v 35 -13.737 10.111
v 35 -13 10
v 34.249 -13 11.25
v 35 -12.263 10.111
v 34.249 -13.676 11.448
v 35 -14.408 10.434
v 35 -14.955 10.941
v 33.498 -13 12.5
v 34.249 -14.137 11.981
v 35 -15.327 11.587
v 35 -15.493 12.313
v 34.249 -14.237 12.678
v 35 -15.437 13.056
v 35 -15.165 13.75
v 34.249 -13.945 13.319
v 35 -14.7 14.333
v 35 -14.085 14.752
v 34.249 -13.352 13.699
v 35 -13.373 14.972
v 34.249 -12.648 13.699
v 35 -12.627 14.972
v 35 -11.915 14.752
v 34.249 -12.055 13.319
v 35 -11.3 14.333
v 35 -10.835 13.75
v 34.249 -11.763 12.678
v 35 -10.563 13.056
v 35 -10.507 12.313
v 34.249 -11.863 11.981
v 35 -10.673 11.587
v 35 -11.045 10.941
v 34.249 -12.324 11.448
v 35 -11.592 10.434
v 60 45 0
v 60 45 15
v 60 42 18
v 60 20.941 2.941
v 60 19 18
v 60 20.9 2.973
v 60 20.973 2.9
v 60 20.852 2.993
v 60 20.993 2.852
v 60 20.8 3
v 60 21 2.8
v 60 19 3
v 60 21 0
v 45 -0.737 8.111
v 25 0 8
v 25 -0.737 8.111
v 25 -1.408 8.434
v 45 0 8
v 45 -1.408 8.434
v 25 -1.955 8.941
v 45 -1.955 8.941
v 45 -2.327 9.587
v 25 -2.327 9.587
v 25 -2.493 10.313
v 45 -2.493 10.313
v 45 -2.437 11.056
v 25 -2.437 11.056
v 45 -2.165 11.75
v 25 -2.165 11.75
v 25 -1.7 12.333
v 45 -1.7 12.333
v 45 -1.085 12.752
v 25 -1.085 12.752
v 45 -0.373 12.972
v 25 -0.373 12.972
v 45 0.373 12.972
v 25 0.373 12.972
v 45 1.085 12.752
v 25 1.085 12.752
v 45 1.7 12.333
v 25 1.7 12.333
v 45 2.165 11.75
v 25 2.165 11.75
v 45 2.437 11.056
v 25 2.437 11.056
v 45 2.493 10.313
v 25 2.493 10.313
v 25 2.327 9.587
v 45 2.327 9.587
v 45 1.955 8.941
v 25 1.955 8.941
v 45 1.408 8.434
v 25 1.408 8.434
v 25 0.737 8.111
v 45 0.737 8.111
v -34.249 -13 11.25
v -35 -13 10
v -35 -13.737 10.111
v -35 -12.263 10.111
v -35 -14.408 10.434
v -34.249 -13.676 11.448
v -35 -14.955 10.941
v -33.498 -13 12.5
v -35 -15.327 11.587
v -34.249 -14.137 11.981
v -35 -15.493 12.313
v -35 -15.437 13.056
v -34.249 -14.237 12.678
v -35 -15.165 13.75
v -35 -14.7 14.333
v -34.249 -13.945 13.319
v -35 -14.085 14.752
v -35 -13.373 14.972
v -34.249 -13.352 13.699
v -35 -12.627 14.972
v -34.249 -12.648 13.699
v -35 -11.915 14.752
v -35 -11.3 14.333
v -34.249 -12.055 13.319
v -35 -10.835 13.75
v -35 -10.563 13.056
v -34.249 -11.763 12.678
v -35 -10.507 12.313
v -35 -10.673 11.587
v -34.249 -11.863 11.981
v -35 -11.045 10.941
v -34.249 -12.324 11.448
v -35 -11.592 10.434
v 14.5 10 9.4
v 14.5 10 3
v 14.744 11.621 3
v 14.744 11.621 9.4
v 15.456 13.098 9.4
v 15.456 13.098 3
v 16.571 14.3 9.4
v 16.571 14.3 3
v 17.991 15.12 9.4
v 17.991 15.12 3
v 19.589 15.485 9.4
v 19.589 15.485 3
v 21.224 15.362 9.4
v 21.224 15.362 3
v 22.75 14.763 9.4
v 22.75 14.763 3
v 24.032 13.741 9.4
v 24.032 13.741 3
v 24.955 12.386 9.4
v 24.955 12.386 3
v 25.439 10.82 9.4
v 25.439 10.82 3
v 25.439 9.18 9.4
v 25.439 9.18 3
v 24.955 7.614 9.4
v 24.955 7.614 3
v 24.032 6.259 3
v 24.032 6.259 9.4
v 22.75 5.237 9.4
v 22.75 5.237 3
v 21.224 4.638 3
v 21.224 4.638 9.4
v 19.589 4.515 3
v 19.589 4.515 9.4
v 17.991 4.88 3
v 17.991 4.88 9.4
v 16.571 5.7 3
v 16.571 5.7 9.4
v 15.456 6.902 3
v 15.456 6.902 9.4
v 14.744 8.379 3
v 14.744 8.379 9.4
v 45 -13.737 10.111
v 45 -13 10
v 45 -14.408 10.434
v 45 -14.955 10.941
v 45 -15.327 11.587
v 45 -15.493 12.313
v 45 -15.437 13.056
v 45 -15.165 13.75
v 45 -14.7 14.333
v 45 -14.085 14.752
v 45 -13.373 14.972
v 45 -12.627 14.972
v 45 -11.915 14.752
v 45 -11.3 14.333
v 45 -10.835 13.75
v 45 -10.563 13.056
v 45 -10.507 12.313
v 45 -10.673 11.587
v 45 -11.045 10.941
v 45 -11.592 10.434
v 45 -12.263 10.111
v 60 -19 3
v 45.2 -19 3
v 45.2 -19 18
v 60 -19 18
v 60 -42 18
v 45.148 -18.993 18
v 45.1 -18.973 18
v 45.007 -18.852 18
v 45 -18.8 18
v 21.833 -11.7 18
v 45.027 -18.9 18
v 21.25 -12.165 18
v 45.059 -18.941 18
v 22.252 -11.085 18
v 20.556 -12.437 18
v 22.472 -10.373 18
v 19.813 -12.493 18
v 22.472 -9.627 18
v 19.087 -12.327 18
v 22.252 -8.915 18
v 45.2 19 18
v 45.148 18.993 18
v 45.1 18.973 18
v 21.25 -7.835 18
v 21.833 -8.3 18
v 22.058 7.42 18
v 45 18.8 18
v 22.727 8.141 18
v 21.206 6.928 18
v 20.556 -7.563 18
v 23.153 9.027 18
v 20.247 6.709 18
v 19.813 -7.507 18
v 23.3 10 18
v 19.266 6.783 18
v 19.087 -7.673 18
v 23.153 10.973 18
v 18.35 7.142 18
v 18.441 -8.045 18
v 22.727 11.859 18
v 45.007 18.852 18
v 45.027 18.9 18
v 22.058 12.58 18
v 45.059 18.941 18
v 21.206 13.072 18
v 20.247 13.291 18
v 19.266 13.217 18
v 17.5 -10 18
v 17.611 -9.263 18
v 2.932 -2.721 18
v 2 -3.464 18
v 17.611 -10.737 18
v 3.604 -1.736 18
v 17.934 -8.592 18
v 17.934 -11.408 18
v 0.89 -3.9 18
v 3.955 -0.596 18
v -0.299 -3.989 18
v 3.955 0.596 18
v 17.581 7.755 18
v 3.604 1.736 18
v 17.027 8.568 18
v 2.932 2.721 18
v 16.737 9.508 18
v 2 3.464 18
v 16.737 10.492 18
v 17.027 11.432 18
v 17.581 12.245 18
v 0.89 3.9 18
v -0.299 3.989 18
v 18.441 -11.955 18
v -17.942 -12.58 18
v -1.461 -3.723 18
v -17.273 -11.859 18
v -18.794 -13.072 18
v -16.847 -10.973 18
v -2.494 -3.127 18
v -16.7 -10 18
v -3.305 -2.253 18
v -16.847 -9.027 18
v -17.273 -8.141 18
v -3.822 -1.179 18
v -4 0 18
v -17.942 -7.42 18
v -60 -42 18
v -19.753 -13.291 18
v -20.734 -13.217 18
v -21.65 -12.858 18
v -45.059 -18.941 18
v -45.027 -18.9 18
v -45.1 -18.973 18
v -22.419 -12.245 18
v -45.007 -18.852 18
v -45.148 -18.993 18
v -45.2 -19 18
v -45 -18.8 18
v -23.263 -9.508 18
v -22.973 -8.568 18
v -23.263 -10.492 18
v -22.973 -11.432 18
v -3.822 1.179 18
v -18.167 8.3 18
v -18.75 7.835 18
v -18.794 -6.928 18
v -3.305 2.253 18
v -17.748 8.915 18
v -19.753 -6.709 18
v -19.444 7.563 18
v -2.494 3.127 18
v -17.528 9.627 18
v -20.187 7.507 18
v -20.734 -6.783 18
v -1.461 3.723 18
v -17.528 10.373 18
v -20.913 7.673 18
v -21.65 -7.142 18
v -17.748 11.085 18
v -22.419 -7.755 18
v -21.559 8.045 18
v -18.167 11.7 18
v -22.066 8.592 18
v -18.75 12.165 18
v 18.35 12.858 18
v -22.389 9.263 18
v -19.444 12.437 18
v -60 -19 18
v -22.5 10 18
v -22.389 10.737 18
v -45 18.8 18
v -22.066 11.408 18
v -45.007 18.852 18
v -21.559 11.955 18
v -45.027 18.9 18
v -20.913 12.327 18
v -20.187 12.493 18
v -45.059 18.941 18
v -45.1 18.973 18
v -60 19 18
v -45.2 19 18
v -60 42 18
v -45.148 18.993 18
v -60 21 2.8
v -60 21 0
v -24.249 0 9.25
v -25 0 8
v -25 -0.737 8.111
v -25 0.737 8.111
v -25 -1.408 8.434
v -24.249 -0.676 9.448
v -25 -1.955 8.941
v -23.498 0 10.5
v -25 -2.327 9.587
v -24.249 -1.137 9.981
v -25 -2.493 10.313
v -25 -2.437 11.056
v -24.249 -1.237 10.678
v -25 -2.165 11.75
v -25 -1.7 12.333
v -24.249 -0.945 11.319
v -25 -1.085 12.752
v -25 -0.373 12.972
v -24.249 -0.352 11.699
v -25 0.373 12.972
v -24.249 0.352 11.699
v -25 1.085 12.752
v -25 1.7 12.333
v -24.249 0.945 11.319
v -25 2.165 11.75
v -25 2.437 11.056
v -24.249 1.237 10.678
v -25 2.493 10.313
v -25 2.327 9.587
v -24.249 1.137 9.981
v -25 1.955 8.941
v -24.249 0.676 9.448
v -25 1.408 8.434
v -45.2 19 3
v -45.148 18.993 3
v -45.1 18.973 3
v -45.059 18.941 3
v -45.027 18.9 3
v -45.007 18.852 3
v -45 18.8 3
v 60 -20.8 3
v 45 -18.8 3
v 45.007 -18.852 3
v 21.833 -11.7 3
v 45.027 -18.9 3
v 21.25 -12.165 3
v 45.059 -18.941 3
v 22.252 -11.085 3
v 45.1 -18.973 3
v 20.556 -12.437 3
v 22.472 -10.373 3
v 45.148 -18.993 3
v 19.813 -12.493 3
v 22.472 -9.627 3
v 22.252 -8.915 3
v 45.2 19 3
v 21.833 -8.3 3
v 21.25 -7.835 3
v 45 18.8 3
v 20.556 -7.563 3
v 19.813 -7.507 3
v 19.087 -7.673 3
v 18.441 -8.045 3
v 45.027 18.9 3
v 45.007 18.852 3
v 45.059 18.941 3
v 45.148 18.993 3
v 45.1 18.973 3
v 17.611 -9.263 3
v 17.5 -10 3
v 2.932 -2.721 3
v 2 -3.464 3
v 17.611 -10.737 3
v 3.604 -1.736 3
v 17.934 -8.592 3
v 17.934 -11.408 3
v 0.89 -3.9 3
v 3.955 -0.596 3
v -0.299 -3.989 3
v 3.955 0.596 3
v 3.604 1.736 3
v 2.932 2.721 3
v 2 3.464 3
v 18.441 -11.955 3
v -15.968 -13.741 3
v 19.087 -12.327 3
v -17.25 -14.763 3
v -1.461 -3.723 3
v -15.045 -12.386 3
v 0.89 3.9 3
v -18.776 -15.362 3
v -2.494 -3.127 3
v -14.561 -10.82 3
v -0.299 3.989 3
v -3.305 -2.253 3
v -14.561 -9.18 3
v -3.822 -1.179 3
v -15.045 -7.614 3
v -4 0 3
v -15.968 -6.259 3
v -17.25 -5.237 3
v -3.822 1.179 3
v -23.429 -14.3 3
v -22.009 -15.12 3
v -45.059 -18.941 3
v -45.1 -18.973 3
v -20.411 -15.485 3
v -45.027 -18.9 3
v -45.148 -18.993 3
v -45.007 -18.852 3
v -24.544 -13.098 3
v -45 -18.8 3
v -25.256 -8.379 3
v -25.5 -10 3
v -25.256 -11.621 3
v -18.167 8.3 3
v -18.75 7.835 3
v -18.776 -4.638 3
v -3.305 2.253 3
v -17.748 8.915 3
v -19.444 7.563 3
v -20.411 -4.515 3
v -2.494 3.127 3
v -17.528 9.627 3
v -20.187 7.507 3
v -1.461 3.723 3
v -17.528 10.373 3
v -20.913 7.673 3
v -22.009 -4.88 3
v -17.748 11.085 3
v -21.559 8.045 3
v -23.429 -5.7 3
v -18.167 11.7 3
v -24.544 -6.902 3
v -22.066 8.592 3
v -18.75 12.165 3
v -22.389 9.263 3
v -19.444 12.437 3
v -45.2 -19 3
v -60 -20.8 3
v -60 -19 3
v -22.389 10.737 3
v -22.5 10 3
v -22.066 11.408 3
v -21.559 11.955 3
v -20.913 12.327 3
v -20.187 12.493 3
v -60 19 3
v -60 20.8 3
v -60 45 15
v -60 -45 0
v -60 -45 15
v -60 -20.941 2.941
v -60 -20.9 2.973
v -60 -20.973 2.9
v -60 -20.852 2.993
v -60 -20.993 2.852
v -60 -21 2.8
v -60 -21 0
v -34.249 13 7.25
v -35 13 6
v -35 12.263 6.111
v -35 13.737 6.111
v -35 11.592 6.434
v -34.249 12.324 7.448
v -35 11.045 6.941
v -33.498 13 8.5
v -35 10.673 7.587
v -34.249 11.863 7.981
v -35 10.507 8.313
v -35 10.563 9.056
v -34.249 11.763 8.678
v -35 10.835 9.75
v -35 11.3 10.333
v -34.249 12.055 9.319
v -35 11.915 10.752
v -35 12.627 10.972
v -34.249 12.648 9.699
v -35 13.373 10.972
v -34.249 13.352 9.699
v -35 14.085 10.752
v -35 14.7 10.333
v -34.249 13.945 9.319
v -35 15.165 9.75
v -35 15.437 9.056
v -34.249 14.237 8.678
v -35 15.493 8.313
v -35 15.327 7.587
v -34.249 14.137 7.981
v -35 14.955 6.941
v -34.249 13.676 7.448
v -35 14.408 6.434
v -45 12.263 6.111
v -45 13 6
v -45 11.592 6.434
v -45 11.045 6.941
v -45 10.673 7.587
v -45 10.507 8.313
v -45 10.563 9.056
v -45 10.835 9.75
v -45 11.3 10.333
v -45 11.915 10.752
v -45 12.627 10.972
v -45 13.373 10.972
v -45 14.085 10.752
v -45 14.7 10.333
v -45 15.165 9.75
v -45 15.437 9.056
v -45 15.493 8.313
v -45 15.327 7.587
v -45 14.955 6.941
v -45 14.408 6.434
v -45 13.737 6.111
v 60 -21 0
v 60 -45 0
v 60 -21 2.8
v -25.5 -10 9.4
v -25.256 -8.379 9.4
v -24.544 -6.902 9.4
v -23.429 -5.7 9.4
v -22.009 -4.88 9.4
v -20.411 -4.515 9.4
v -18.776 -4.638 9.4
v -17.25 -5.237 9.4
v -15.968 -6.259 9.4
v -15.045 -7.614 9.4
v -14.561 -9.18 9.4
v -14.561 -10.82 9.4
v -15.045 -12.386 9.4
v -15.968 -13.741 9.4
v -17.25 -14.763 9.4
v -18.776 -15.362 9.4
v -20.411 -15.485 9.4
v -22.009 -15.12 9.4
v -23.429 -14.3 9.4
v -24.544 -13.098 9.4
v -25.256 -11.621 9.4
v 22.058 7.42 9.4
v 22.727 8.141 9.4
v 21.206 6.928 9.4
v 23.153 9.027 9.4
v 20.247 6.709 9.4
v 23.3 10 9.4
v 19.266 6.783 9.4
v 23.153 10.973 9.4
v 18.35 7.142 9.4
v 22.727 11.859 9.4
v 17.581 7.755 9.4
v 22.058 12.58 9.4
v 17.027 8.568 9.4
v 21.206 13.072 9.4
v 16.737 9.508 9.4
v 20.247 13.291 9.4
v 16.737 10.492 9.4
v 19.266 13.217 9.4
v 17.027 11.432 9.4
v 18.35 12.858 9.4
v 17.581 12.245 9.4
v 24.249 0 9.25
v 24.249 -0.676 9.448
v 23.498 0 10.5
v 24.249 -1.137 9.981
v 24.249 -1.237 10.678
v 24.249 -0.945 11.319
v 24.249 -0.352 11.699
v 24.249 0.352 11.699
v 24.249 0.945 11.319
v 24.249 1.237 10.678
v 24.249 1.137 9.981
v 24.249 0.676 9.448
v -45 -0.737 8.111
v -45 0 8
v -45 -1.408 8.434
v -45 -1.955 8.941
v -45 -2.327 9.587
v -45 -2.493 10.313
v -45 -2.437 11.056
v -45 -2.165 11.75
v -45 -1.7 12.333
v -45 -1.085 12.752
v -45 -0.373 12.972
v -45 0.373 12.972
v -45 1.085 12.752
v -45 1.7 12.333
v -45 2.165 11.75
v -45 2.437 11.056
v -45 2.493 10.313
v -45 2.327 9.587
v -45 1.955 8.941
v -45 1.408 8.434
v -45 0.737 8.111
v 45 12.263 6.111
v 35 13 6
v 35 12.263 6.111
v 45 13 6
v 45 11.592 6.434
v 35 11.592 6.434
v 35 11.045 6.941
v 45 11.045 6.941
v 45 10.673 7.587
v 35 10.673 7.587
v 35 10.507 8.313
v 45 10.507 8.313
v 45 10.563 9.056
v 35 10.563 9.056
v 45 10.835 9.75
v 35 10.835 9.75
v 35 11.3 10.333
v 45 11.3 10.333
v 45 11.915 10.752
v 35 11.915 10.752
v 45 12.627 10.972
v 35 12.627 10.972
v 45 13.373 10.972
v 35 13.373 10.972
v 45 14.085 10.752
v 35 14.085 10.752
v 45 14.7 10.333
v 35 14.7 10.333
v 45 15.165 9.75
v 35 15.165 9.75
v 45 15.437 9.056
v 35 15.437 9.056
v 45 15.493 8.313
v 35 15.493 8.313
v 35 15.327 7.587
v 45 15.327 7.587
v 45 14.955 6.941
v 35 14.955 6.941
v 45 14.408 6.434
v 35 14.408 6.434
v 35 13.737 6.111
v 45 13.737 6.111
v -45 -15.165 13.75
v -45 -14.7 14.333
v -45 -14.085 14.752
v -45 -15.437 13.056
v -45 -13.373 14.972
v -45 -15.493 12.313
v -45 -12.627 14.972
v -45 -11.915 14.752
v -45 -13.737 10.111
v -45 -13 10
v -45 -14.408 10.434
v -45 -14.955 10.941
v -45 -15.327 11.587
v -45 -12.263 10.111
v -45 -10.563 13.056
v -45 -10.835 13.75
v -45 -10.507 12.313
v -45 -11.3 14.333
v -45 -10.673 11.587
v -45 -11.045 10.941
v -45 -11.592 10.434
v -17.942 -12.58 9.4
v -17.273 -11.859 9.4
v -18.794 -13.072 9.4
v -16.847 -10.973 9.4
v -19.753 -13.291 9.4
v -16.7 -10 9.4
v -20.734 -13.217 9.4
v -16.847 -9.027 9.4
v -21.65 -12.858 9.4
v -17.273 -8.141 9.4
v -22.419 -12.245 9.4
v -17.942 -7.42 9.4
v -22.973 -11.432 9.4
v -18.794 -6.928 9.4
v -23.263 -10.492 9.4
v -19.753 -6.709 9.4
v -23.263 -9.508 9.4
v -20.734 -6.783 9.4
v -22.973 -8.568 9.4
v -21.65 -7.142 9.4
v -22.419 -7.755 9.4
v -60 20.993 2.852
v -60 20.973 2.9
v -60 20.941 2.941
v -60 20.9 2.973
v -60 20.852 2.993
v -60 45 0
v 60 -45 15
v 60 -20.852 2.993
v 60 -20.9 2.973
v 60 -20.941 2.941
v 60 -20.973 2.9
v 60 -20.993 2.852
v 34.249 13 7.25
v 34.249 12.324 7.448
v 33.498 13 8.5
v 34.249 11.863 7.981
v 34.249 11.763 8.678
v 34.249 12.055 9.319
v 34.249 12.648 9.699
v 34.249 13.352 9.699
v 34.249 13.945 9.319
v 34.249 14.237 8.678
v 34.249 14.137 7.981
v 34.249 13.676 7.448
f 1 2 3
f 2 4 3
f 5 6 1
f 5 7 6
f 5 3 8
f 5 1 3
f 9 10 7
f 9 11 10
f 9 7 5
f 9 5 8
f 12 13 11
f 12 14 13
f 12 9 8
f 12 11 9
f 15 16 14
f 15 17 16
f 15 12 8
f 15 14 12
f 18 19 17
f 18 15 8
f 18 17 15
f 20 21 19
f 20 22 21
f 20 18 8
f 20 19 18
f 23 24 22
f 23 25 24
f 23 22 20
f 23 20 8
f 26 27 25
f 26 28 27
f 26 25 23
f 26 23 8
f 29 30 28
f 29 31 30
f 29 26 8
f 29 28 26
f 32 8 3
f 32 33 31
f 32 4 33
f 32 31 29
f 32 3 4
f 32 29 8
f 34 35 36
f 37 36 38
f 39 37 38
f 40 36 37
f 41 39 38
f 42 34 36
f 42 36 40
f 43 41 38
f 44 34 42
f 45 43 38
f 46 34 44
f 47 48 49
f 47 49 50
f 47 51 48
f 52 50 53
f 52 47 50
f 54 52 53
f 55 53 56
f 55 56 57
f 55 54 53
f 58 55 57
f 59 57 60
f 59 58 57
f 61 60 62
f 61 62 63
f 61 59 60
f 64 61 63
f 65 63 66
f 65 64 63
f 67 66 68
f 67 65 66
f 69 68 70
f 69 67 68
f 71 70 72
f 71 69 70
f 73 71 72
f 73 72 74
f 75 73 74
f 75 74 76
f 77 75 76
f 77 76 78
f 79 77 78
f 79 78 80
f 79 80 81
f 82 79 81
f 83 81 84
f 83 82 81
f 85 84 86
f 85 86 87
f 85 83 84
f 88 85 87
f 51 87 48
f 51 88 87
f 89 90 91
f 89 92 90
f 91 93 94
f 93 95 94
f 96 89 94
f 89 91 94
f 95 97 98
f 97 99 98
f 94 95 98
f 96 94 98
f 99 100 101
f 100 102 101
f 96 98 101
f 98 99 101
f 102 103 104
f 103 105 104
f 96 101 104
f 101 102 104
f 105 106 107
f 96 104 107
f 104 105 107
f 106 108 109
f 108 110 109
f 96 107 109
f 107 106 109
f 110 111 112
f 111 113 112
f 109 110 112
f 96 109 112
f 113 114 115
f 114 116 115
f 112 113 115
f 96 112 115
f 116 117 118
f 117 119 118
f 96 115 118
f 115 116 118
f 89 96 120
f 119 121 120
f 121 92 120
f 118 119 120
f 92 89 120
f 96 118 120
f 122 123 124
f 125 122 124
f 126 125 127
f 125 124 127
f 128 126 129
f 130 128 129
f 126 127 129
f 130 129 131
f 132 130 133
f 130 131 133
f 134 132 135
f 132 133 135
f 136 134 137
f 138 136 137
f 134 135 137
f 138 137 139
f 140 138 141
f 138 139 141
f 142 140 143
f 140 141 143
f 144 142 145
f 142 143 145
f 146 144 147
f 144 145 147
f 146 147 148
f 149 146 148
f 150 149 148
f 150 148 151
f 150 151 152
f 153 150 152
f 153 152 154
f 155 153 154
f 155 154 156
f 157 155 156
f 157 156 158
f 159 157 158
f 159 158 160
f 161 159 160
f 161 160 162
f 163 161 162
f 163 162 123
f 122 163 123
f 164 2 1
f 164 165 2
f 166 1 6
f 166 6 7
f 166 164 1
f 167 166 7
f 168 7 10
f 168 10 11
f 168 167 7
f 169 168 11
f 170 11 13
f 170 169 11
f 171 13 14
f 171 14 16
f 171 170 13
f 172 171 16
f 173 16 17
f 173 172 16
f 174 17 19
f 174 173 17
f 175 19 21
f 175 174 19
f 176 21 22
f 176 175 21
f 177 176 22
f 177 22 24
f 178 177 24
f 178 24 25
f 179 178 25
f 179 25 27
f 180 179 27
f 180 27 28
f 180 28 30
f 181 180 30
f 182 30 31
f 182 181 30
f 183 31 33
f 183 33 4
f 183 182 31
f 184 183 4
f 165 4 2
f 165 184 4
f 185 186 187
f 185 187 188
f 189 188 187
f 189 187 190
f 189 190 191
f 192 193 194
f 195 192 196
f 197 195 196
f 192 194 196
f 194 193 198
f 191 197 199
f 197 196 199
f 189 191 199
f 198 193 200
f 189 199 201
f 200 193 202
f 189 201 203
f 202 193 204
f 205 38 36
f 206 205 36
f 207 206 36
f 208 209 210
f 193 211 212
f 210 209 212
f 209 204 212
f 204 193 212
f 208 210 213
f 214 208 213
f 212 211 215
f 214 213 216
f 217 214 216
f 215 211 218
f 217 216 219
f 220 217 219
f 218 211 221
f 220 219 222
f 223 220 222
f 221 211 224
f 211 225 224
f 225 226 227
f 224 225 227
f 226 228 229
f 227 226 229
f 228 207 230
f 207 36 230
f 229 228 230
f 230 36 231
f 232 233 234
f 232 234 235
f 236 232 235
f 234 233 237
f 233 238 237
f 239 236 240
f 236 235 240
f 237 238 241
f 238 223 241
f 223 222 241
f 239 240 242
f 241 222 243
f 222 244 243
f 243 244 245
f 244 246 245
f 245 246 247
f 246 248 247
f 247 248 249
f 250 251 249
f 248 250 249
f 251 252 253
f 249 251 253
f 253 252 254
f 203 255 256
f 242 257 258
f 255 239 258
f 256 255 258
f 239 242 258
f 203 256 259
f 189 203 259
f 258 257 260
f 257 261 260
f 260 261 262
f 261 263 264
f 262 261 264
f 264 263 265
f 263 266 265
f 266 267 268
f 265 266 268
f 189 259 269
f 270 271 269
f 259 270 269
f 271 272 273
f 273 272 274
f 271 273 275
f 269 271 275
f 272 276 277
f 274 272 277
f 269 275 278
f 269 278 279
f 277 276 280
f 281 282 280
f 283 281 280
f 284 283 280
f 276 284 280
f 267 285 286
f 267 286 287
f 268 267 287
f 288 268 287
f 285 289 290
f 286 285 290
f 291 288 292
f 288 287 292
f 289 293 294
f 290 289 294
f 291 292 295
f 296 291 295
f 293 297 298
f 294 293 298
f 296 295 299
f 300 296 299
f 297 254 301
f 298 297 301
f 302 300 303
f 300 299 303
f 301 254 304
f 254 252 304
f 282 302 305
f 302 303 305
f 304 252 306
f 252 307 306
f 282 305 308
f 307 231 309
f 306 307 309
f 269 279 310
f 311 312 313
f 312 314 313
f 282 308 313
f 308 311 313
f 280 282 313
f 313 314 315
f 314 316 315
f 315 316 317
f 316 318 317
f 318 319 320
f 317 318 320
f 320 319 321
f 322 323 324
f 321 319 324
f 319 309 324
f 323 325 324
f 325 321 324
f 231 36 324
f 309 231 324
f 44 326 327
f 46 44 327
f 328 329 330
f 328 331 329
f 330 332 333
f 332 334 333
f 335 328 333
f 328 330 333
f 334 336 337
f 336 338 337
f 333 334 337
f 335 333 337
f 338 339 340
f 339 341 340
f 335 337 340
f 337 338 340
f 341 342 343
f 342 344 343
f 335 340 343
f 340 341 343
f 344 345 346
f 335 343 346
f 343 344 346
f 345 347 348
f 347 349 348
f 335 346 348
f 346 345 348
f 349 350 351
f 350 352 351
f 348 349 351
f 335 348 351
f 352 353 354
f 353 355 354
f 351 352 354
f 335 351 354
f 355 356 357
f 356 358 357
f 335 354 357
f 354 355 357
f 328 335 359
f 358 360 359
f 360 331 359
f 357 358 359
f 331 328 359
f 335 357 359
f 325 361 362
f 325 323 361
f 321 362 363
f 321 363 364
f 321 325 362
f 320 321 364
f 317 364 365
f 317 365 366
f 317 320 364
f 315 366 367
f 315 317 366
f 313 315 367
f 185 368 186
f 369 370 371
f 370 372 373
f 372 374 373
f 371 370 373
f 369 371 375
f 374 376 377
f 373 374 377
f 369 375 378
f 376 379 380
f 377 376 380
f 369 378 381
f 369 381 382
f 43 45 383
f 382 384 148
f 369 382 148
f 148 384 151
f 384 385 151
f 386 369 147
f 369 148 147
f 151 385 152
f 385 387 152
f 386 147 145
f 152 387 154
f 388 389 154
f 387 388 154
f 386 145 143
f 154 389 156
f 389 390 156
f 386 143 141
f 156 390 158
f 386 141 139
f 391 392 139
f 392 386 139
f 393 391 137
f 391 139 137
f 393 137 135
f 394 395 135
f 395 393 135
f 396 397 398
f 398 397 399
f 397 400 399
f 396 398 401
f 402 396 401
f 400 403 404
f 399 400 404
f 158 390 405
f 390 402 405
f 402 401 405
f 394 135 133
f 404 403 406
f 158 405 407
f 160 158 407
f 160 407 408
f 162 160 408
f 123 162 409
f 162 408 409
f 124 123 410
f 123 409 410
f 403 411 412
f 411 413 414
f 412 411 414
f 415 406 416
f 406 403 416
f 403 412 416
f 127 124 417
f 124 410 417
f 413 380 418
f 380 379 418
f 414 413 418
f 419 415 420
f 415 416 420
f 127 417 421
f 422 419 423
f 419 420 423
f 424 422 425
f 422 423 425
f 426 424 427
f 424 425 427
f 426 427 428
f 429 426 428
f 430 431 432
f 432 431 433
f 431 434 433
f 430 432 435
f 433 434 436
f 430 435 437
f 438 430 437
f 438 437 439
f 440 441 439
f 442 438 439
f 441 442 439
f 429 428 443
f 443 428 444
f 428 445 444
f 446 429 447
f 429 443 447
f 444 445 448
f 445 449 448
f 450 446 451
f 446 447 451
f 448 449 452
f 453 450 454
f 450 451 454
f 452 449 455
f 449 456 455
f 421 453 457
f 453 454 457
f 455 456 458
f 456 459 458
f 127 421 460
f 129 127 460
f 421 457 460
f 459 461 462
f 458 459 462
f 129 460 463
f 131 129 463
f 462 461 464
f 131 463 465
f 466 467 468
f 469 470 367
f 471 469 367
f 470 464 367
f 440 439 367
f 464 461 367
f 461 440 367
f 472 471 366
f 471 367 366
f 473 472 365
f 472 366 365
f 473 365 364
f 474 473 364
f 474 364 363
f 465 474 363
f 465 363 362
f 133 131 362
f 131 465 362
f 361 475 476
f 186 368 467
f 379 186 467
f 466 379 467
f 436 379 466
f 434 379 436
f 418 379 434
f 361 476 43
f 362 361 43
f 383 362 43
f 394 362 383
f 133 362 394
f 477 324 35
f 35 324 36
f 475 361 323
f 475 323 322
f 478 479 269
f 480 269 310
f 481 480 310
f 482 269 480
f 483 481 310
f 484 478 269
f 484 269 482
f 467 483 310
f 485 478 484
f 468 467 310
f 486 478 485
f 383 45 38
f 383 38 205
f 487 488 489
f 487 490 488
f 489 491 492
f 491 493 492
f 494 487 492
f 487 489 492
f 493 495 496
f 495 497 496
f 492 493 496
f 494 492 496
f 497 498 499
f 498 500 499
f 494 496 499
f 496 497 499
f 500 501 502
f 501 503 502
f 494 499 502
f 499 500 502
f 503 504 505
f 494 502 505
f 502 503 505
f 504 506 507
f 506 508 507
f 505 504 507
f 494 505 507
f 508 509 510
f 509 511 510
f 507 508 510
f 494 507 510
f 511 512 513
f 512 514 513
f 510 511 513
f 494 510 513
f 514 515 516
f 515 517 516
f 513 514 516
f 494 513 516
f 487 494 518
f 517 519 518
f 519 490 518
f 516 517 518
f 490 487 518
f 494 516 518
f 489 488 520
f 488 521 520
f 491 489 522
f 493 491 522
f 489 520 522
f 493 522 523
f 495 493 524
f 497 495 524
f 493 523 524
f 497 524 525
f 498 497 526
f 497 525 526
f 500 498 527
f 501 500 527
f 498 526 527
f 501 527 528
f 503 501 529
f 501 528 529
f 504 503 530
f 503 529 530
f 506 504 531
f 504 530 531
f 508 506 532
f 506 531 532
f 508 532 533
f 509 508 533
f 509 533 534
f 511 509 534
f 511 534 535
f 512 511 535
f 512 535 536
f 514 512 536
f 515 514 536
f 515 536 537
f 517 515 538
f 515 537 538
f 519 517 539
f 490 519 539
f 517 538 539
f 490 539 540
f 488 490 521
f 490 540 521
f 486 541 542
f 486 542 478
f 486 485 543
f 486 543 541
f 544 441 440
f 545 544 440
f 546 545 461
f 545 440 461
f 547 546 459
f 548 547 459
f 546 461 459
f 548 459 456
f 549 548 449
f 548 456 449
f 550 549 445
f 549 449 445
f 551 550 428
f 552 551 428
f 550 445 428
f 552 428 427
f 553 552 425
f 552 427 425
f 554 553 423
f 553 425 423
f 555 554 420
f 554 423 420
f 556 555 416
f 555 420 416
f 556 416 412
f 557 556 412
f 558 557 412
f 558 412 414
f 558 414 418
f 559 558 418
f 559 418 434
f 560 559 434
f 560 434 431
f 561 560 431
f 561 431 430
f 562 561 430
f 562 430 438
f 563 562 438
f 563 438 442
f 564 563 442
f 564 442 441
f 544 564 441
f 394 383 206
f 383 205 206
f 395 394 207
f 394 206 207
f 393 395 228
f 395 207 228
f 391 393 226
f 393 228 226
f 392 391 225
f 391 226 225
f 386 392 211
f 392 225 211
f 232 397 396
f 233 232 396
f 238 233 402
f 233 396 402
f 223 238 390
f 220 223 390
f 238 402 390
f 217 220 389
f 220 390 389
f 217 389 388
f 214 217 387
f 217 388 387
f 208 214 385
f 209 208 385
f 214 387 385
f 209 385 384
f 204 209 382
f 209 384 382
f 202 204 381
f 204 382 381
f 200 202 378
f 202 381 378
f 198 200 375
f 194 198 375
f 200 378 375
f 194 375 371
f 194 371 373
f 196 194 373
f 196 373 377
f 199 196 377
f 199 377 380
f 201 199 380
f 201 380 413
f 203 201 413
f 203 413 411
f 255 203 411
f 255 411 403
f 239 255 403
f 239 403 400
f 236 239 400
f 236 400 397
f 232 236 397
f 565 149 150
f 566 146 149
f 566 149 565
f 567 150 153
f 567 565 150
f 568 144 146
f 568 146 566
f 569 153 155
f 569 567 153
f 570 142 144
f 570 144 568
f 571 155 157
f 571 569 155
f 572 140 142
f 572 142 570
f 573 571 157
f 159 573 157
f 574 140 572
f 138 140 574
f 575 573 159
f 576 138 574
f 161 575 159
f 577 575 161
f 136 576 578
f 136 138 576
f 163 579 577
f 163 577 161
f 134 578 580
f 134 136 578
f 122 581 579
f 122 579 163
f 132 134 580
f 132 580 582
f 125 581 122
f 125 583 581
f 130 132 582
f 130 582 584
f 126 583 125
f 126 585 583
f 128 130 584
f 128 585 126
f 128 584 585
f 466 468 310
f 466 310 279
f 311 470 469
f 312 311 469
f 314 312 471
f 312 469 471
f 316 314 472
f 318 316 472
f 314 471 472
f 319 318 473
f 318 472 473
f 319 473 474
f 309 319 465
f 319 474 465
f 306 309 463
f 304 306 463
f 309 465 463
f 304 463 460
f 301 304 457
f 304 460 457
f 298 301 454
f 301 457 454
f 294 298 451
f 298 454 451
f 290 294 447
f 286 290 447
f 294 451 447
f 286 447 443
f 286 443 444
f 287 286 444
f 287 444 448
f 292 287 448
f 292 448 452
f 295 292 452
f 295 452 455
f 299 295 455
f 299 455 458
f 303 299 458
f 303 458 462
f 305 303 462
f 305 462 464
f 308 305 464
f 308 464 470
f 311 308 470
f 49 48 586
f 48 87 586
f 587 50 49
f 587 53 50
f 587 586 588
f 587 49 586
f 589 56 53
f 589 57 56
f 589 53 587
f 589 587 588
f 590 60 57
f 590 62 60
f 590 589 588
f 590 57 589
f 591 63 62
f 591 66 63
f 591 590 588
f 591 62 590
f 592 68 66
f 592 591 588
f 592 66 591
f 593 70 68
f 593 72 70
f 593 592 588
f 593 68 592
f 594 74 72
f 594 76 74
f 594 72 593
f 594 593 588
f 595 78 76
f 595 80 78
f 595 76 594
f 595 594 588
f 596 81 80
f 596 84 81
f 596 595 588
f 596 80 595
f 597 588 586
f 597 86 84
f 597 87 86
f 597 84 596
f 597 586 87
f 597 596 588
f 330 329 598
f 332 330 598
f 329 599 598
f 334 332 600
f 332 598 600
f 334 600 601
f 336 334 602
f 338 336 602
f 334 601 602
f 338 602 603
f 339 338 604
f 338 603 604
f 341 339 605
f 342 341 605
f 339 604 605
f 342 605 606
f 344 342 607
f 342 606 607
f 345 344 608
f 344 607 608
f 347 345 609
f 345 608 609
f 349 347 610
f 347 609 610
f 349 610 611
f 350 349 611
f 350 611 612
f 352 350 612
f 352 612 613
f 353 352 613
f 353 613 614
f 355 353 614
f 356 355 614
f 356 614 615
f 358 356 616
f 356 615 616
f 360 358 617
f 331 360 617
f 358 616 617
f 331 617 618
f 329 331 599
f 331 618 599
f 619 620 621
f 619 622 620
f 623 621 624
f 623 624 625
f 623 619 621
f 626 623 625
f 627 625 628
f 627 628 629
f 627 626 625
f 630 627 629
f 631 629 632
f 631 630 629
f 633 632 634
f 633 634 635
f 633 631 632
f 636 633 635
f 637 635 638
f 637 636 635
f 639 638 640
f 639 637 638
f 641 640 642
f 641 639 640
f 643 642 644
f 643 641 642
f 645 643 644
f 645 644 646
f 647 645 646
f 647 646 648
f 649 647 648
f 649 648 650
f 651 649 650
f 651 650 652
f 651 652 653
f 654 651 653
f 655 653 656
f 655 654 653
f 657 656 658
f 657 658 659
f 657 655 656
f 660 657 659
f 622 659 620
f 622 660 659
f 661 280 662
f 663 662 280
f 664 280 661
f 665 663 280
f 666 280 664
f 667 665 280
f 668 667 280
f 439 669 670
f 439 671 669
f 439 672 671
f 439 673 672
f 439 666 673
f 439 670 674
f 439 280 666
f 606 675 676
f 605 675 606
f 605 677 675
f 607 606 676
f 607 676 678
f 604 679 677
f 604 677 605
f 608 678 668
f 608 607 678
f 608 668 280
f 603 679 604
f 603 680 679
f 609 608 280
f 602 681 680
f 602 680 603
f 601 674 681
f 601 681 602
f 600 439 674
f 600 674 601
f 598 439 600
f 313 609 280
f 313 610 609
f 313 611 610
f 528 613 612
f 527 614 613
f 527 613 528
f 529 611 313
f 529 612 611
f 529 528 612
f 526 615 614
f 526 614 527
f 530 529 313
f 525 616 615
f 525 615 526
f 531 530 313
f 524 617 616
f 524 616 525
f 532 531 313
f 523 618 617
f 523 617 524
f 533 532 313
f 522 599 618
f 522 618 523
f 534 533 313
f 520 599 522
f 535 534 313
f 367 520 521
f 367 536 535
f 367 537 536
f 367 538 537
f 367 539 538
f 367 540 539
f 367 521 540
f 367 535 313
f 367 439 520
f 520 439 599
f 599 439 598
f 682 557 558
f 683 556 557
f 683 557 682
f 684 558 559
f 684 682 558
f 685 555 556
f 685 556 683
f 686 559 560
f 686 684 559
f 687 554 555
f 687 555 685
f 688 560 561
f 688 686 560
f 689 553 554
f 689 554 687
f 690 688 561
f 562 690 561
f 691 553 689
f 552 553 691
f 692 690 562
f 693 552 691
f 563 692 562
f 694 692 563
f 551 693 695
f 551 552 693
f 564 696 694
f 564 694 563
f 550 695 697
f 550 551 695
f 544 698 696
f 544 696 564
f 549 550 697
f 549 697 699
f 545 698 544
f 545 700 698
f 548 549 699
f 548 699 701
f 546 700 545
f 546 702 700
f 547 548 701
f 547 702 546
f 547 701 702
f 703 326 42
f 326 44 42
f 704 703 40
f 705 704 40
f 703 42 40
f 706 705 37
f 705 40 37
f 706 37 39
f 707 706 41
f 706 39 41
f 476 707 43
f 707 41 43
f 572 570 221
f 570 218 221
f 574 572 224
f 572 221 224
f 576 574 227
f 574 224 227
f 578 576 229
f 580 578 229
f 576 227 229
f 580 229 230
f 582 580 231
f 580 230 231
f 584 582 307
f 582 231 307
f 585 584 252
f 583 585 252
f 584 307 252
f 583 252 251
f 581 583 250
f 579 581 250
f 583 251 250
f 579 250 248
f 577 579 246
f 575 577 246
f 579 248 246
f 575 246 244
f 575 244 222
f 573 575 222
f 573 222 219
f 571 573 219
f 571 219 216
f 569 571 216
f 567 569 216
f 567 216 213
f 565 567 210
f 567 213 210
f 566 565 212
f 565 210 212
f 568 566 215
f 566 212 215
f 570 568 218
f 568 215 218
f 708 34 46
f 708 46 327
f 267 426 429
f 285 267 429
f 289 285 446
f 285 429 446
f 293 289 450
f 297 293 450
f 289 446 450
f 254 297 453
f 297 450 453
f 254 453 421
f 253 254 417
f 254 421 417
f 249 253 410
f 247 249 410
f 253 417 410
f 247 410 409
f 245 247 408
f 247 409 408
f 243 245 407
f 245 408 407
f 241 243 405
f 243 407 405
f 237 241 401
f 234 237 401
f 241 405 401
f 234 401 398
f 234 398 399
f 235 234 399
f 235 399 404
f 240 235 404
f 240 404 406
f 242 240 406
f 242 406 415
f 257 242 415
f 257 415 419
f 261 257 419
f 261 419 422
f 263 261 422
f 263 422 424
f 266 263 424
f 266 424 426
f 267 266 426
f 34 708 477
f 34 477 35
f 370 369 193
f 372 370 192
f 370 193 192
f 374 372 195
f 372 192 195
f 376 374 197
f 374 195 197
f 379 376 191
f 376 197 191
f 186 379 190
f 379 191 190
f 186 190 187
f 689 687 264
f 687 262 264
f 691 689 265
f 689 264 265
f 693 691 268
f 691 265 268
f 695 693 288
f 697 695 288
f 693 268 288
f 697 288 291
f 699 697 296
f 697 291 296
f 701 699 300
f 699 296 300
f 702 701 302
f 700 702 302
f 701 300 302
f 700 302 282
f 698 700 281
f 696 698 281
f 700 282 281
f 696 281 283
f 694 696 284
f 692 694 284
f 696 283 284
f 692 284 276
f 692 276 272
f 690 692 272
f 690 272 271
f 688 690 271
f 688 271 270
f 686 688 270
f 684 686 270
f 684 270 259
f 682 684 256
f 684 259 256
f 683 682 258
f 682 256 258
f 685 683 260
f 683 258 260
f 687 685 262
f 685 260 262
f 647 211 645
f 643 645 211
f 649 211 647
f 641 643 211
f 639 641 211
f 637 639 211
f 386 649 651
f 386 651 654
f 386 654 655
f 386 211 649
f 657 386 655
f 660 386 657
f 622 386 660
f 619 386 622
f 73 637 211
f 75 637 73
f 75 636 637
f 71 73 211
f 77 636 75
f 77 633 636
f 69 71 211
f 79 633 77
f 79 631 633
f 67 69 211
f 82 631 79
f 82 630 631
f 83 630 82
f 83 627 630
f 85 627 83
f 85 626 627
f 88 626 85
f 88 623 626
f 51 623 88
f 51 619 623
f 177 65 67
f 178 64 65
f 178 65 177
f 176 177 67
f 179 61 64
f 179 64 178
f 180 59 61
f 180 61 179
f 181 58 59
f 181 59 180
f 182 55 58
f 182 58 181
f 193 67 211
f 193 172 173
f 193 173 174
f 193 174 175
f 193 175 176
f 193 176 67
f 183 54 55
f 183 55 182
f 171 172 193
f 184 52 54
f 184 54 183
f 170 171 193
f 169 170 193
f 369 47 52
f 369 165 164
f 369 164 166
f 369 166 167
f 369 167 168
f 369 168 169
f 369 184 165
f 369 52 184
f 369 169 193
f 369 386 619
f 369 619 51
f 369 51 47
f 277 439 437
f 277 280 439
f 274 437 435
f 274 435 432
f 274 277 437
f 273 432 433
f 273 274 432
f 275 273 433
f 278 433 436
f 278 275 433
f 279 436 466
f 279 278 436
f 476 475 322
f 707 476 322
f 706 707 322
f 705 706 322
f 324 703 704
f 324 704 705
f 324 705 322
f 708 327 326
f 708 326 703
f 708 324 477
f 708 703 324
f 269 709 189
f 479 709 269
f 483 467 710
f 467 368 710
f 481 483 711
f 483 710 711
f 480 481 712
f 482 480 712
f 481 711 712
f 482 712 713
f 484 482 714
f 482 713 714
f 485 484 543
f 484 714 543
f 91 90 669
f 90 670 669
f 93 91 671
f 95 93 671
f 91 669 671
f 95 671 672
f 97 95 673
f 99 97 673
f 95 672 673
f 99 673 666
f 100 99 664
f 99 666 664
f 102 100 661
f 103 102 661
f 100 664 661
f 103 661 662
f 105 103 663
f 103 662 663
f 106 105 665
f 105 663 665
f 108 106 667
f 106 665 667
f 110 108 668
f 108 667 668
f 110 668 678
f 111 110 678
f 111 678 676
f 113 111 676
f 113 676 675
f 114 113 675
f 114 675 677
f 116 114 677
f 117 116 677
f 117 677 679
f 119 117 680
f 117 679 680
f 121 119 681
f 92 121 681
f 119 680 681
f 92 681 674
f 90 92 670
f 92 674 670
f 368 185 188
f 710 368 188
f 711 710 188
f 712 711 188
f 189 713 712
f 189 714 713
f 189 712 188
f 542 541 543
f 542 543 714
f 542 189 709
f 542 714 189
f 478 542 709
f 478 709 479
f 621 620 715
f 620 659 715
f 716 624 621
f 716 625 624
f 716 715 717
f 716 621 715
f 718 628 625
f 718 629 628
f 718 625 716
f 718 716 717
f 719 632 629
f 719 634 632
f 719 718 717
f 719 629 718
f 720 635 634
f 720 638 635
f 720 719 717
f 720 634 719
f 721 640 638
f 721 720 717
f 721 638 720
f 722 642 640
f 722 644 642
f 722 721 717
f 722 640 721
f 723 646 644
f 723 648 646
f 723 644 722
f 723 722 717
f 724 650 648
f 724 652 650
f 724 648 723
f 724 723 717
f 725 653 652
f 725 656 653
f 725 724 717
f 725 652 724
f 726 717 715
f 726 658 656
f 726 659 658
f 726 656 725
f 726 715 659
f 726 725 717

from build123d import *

# Parameters (mm, degrees)
ESTRUSIONE_ESTRUSIONE1_DEPTH                         = 18
TAGLIO_ESTRUSIONE1_DEPTH                             = 78.129760793
TAGLIO_ESTRUSIONE1_DEPTH_BACK                        = 78.129760793
SCHIZZO2_W                                           = 3
SCHIZZO2_H                                           = 42
FORO_8_0_8_1_D                                       = 8
FORO_5_0_5_2_D                                       = 5
FORO_LAMATO_PER_VITE_M6_A_TESTA_CILINDRI_D           = 6.6
FORO_LAMATO_PER_VITE_M6_A_TESTA_CILINDRI_CBORE_D     = 11
FORO_LAMATO_PER_VITE_M6_A_TESTA_CILINDRI_CBORE_DEPTH = 6.4
FORO_5_0_5_3_AT_2_COUNT                              = 2
FORO_5_0_5_3_AT_2_PITCH                              = 26.305892876
SMUSSO1_SIZE                                         = 3
RACCORDO1_R                                          = 0.2


with BuildPart() as part:
    # Schizzo1 → Estrusione-Estrusione1 (new body)
    with BuildSketch(Plane.XY):
        Polygon((-60, 45), (60, 45), (60, 19), (45, 19), (45, -19), (60, -19), (60, -45), (-60, -45), (-60, -19), (-45, -19), (-45, 19), (-60, 19), align=None)
    extrude(amount=ESTRUSIONE_ESTRUSIONE1_DEPTH)

    # Schizzo2 → Taglio-Estrusione1 (cut, two sides: drawn at the far end of the back side and taken through both)
    with BuildSketch(Plane(origin=(0, 0, 0), x_dir=(0, 0, -1), z_dir=(1, 0, 0)).offset(-TAGLIO_ESTRUSIONE1_DEPTH_BACK)):
        with Locations((-1.5, 0)):
            Rectangle(SCHIZZO2_W, SCHIZZO2_H)
    extrude(amount=TAGLIO_ESTRUSIONE1_DEPTH + TAGLIO_ESTRUSIONE1_DEPTH_BACK, mode=Mode.SUBTRACT)

    # Schizzo4 → Foro filettato M6-1 (revolve, cut)
    with BuildSketch(Plane(origin=(45, 0, 10.5), x_dir=(0, 0, -1), z_dir=(0, 1, 0))):
        Polygon((0, 0), (0, 21.502151548), (2.5, 20), (2.5, 0), align=None)
    foro_filettato_m6_1 = revolve(axis=Axis((51.35, 0, 10.5), (-1, 0, 0)), mode=Mode.SUBTRACT)

    # Foro Ø8.0 (8)-1 (through all)
    with Locations(Plane.XY.offset(18)):
        with Locations((0, 0)):
            Hole(FORO_8_0_8_1_D / 2)

    # Foro Ø5.0 (5)-2 (through all)
    with Locations(Plane.XY.offset(18)):
        with Locations((20, -10), (-20, 10)):
            Hole(FORO_5_0_5_2_D / 2)

    # Foro lamato per Vite M6 a testa cilindrica-1 (through all)
    with Locations(Plane(origin=(0, 0, 3), x_dir=(-1, 0, 0), z_dir=(0, 0, -1))):
        with Locations((-20, 10), (20, -10)):
            CounterBoreHole(FORO_LAMATO_PER_VITE_M6_A_TESTA_CILINDRI_D / 2, FORO_LAMATO_PER_VITE_M6_A_TESTA_CILINDRI_CBORE_D / 2, FORO_LAMATO_PER_VITE_M6_A_TESTA_CILINDRI_CBORE_DEPTH)

    # Schizzo14 → Foro Ø5.0 (5)-3 (revolve, cut)
    with BuildSketch(Plane(origin=(45, -13, 12.5), x_dir=(0, 0, -1), z_dir=(0, 1, 0))):
        Polygon((0, 0), (0, 11.502151548), (2.5, 10), (2.5, 0), align=None)
    foro_5_0_5_3 = revolve(axis=Axis((51.35, -13, 12.5), (-1, 0, 0)), mode=Mode.SUBTRACT)

    # Foro Ø5.0 (5)-3 at 2: Foro Ø5.0 (5)-3 ×2
    with Locations(*[Vector(0, 0.9883716976506173, -0.15205718425394077) * (i * FORO_5_0_5_3_AT_2_PITCH) for i in range(1, FORO_5_0_5_3_AT_2_COUNT)]):
        add(foro_5_0_5_3, mode=Mode.SUBTRACT)

    # Smusso1
    smusso1_edges = [part.edges().sort_by_distance(p)[0] for p in [
        (0, 45, 18),
        (0, -45, 18),
    ]]
    chamfer(smusso1_edges, length=SMUSSO1_SIZE)

    # Raccordo1
    raccordo1_edges = [part.edges().sort_by_distance(p)[0] for p in [
        (45, -19, 10.5),
        (45, 19, 10.5),
        (-45, 19, 10.5),
        (-45, -19, 10.5),
        (0, -21, 3),
        (0, 21, 3),
    ]]
    fillet(raccordo1_edges, radius=RACCORDO1_R)

    # Specchia1: Foro filettato M6-1, Foro Ø5.0 (5)-3 across plane
    add(foro_filettato_m6_1.mirror(Plane(origin=(0, 0, 0), x_dir=(0, 0, 1), z_dir=(1, 0, 0))), mode=Mode.SUBTRACT)
    add(foro_5_0_5_3.mirror(Plane(origin=(0, 0, 0), x_dir=(0, 0, 1), z_dir=(1, 0, 0))), mode=Mode.SUBTRACT)

    # Specchia1 copy 1 sketch → Specchia1 copy 1 (revolve, cut)
    with BuildSketch(Plane(origin=(-45, 13, 8.5), x_dir=(0, 0, -1), z_dir=(0, 1, 0))):
        Polygon((0, 0), (0, -11.502151548), (2.5, -10), (2.5, 0), align=None)
    revolve(axis=Axis((-51.35, 13, 8.5), (-1, 0, 0)), mode=Mode.SUBTRACT)


solid = part.part
